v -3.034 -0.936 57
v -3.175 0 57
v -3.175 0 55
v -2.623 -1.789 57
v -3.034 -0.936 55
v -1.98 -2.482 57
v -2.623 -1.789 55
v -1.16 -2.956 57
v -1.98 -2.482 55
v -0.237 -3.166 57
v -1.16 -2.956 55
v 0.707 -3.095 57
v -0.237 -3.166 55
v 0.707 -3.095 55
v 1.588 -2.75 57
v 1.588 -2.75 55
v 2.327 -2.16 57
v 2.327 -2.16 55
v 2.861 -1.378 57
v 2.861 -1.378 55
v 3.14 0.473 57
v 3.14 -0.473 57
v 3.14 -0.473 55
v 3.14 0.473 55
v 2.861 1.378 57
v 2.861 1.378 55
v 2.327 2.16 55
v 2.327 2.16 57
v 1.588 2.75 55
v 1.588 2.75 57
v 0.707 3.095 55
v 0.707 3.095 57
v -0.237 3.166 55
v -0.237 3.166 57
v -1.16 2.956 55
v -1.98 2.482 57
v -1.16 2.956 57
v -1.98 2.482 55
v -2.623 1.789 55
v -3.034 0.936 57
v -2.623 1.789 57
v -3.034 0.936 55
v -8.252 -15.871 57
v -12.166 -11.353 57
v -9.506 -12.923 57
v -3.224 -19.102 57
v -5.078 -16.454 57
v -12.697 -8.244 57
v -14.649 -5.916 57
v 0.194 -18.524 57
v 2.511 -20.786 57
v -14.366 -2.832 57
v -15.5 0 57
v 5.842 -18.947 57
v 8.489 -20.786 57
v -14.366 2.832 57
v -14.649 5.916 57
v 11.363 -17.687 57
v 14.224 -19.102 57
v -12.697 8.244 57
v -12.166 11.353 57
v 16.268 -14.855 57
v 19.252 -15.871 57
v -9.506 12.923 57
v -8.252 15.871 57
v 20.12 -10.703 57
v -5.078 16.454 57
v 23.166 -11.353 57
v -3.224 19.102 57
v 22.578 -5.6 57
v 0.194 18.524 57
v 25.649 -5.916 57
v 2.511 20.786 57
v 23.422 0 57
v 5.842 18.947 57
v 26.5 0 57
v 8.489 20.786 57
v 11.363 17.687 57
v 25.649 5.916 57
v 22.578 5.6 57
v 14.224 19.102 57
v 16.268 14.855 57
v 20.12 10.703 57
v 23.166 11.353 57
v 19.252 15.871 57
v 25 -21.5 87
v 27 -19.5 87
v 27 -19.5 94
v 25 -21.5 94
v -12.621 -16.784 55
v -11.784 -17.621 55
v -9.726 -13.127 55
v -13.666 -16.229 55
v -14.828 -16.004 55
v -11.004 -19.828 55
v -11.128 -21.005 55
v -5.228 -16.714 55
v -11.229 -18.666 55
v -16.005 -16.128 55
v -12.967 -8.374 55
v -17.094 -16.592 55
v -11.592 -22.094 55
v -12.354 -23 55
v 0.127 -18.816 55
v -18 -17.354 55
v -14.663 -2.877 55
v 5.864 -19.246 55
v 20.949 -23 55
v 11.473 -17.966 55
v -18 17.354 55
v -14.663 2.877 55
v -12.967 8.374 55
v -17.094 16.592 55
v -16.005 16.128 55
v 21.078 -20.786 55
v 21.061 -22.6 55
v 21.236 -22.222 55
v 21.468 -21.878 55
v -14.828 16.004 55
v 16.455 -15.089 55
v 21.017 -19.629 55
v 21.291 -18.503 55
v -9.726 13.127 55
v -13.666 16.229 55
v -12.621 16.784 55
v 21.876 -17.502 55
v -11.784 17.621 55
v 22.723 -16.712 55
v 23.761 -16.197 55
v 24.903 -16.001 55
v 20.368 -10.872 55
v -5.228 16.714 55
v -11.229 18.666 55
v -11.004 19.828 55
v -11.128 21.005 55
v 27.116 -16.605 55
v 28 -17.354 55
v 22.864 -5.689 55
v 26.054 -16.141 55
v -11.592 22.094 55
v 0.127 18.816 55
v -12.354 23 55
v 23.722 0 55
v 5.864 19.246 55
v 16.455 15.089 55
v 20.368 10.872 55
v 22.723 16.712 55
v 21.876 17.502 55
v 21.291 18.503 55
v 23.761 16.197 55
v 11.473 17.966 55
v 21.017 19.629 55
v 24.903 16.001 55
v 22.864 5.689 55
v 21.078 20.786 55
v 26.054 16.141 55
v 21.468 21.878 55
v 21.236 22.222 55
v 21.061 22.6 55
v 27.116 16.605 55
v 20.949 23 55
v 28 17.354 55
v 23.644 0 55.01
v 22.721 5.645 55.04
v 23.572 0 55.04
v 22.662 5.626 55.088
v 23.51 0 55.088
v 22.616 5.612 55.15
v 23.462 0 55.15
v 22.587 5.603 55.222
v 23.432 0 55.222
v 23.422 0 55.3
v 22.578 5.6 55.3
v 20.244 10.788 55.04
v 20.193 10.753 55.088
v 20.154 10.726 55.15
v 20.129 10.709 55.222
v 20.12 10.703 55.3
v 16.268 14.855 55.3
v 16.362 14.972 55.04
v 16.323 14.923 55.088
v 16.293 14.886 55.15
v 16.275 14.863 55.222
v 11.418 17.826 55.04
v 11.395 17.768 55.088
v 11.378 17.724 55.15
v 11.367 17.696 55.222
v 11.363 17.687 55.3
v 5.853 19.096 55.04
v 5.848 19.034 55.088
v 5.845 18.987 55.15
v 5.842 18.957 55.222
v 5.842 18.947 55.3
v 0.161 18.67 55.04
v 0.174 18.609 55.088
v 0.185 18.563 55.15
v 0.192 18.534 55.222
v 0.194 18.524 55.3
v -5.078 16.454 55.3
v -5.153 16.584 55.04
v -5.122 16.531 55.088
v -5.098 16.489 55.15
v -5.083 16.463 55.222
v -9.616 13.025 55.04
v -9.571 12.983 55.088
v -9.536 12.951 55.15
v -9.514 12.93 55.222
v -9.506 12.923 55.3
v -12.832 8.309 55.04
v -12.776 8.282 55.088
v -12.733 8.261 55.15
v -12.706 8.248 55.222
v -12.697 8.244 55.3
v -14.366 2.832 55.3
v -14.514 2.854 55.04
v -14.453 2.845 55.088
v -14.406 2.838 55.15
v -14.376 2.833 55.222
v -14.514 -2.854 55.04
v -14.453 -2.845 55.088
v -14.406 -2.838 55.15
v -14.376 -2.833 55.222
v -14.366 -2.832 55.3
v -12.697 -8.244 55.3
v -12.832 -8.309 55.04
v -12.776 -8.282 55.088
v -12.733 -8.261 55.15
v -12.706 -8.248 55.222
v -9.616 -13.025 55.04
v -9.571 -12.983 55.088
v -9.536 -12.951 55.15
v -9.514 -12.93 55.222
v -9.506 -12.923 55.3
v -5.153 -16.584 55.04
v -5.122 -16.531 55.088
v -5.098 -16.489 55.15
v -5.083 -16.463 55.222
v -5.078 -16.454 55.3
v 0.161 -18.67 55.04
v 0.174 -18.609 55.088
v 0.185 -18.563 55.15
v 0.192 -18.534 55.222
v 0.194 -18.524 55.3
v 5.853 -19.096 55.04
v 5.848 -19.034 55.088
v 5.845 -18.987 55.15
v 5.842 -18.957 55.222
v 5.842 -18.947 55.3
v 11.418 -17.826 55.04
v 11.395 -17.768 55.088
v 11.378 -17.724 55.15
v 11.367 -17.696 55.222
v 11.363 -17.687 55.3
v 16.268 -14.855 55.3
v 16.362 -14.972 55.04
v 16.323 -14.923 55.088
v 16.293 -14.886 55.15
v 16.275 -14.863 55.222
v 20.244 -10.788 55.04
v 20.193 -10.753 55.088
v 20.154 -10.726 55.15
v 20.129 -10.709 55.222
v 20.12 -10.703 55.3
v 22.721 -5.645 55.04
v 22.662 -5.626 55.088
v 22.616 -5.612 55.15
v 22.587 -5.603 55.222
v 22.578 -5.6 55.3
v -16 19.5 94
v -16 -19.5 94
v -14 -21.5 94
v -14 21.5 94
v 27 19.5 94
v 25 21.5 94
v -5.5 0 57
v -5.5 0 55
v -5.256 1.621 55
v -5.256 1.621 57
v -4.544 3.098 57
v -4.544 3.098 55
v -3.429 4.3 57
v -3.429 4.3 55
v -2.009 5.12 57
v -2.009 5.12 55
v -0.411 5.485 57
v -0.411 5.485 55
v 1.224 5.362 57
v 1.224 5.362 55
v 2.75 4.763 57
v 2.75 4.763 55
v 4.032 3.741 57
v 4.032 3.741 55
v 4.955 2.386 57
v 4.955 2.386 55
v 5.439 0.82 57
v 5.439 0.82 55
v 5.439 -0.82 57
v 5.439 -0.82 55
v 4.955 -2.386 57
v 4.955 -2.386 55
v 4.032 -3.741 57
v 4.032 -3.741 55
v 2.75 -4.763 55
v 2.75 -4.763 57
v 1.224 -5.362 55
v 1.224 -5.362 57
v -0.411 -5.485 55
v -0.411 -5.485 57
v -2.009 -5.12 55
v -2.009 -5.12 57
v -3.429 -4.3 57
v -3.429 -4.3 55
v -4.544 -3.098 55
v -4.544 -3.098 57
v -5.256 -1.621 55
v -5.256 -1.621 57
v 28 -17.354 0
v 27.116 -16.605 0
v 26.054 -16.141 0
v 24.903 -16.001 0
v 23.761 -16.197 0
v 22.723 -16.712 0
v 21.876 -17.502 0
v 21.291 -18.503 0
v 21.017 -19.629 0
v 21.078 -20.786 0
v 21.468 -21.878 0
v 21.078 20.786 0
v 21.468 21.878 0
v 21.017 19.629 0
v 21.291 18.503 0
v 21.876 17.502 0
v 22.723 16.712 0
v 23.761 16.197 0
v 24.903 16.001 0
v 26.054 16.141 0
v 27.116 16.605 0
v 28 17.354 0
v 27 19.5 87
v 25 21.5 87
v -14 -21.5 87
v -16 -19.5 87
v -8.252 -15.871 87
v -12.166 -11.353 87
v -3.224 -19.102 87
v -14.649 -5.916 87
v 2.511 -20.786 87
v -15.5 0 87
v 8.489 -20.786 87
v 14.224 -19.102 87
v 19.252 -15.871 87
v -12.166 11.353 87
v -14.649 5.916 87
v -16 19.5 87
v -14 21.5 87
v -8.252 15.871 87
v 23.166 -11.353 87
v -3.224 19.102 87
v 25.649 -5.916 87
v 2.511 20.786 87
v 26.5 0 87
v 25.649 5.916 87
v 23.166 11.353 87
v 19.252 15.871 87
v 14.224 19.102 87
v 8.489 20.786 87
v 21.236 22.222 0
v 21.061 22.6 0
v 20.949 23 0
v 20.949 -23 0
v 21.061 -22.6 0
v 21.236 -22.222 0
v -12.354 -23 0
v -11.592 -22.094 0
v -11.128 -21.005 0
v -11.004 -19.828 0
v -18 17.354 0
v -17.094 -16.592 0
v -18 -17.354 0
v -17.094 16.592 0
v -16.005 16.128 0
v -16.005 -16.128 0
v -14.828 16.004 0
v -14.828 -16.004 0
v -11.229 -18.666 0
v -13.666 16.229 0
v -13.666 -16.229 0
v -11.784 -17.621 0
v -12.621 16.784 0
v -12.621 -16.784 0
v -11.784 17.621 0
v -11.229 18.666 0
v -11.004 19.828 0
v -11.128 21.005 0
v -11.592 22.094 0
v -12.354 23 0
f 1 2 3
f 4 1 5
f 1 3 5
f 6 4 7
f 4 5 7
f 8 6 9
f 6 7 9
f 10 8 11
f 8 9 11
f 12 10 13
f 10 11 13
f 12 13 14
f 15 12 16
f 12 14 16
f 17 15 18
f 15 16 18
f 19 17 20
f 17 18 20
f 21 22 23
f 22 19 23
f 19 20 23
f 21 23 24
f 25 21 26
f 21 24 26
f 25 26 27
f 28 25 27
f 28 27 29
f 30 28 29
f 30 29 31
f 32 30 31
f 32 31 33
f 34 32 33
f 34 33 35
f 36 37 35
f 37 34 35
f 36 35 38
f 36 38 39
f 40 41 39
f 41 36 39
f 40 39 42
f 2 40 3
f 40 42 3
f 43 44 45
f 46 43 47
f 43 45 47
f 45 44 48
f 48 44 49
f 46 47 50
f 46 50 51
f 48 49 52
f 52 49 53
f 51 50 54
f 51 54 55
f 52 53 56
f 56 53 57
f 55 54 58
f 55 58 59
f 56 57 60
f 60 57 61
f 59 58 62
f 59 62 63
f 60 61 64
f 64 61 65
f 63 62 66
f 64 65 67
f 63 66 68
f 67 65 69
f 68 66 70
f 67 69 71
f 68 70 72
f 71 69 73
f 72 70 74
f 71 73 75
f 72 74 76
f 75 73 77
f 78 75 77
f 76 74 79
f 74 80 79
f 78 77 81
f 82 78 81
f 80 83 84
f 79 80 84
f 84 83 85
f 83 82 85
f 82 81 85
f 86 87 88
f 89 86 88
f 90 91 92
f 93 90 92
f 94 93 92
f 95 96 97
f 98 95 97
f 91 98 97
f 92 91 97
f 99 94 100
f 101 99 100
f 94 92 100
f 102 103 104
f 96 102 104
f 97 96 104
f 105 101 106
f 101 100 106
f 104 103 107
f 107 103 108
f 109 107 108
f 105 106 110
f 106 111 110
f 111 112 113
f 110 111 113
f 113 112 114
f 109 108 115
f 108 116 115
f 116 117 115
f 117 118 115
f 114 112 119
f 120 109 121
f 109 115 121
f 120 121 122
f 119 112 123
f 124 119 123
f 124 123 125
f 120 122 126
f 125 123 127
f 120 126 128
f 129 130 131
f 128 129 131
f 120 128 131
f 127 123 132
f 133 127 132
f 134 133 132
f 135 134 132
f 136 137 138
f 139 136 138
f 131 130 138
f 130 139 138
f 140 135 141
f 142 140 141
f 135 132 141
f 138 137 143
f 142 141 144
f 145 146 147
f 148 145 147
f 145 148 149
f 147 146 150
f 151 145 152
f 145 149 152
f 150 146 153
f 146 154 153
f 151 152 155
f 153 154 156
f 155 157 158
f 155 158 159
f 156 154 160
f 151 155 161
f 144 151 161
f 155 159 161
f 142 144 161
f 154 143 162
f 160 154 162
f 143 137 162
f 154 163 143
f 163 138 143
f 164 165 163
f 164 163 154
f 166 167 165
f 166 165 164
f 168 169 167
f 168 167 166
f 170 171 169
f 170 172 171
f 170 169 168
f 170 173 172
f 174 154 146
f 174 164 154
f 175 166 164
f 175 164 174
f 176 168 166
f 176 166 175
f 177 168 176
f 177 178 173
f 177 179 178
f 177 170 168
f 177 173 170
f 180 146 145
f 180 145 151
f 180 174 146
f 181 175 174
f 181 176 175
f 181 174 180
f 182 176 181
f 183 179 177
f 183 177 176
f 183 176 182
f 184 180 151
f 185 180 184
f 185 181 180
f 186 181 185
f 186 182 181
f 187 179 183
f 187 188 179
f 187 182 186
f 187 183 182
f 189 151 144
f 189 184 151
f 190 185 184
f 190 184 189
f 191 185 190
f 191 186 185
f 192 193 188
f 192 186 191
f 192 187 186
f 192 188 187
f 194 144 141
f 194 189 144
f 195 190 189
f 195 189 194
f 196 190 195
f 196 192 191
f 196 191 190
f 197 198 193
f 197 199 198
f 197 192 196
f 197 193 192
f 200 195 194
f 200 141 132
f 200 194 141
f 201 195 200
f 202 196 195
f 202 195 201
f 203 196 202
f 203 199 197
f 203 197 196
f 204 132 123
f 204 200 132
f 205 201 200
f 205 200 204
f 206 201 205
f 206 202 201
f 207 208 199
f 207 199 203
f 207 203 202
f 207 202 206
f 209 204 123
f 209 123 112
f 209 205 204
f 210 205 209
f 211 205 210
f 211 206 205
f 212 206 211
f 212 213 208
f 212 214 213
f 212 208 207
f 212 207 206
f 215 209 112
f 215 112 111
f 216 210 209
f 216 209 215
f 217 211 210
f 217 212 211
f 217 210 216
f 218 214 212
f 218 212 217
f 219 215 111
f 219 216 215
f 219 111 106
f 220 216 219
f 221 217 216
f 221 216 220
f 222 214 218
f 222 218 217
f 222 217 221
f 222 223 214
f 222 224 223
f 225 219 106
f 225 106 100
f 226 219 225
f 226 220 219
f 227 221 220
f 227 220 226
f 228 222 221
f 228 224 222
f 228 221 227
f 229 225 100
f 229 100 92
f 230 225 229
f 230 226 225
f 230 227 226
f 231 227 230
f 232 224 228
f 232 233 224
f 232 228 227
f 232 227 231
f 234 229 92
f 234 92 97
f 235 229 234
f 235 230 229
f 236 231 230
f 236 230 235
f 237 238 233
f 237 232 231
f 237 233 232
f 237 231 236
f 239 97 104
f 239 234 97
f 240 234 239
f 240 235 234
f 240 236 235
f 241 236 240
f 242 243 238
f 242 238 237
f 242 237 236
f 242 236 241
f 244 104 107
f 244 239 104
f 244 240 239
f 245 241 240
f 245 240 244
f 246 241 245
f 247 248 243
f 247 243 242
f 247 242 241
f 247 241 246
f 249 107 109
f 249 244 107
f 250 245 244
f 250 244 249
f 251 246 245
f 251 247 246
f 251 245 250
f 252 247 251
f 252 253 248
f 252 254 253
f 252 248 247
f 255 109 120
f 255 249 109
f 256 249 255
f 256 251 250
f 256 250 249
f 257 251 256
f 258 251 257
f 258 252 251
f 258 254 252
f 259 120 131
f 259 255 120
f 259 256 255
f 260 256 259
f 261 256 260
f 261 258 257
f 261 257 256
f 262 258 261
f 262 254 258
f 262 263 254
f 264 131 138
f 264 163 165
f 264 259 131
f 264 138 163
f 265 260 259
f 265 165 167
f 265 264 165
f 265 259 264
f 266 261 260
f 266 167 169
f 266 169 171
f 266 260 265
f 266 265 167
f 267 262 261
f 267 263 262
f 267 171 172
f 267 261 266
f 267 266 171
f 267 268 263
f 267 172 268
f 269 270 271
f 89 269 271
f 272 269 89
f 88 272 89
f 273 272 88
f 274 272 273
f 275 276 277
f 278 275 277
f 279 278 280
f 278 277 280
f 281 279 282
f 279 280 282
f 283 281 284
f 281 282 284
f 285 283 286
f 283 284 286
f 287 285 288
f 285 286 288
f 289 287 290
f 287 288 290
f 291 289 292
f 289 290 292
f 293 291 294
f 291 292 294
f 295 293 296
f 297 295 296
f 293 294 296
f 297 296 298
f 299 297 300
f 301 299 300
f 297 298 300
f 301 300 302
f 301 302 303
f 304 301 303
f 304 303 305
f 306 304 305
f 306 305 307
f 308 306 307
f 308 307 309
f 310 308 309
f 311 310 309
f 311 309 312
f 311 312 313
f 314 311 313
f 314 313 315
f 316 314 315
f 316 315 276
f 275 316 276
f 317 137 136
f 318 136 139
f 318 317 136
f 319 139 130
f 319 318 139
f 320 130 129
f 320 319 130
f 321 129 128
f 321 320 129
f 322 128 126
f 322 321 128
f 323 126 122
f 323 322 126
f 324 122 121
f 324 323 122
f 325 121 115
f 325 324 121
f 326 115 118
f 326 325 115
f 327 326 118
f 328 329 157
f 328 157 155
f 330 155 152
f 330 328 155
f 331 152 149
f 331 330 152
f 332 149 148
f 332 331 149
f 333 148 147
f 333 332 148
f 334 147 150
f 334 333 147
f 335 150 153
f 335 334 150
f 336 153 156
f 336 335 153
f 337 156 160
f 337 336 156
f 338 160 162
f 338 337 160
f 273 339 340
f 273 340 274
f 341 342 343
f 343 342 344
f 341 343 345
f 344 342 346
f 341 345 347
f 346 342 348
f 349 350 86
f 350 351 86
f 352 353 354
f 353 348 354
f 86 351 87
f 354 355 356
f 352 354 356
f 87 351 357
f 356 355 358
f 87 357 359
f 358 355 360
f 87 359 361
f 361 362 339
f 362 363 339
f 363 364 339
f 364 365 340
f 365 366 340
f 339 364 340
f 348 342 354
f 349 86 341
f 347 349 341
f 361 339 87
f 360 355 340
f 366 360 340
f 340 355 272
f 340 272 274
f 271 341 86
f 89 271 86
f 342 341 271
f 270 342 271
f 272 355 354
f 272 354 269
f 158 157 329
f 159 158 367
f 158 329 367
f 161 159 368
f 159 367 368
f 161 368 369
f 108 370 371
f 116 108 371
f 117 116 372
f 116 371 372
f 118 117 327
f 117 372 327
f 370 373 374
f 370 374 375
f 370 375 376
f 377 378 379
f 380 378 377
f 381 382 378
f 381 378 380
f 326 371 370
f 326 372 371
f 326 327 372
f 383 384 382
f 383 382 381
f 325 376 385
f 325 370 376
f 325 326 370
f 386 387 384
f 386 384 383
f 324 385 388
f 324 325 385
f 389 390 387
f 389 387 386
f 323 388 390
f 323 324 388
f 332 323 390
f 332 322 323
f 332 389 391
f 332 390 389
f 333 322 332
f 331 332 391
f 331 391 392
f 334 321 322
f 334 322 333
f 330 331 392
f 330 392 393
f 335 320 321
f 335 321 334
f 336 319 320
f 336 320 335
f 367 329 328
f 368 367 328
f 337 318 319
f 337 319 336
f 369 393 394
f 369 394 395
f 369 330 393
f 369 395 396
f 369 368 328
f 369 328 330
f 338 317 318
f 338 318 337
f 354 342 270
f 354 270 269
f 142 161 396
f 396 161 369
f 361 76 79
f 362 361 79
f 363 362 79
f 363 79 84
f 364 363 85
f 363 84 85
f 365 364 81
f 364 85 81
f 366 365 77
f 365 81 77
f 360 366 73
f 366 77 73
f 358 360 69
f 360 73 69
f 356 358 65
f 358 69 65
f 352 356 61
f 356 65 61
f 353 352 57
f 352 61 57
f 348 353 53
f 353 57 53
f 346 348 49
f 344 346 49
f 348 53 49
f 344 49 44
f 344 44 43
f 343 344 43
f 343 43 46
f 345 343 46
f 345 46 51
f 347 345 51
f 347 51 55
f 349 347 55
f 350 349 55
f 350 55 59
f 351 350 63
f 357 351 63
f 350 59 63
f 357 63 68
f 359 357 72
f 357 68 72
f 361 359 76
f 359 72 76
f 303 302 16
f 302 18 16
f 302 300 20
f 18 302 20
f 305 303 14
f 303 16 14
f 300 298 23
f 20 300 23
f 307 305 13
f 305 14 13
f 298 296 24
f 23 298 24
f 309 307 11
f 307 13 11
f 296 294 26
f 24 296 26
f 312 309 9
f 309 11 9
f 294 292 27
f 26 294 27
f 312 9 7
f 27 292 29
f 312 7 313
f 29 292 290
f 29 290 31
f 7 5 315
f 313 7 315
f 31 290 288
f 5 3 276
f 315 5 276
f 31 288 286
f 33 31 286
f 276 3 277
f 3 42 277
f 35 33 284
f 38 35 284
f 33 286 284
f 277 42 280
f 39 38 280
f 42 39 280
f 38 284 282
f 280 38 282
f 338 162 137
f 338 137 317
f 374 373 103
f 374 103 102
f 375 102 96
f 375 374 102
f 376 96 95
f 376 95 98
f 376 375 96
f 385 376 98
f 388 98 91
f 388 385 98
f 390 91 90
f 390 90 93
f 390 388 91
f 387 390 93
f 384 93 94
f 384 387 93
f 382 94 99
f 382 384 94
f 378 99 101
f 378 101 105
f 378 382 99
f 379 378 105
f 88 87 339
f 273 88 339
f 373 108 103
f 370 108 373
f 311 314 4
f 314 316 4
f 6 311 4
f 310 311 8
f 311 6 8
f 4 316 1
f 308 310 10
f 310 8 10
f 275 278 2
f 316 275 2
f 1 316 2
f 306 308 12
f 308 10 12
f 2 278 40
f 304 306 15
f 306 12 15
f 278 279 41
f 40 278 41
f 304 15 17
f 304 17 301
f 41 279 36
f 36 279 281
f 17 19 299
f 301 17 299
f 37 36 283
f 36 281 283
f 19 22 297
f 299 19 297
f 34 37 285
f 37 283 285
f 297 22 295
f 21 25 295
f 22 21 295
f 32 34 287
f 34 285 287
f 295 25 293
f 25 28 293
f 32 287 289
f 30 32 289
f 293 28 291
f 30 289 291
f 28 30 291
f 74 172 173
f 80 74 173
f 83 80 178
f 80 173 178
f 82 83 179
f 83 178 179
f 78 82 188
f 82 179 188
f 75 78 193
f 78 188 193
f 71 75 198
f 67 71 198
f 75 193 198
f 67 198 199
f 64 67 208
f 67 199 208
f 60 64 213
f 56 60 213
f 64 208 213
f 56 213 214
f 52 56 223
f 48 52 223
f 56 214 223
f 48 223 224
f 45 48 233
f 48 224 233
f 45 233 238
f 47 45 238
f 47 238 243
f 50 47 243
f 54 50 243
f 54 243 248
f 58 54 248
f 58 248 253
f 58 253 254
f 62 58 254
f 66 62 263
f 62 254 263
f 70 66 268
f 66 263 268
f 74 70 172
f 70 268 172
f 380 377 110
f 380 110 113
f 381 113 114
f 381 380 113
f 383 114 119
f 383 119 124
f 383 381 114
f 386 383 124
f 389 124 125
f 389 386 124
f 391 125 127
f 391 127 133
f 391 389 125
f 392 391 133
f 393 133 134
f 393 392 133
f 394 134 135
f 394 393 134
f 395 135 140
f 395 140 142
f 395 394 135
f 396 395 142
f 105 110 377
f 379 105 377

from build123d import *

# Parameters (mm, degrees)
SKETCH_1_W                  = 55
SKETCH_1_H                  = 46
EXTRUDE_1_DEPTH             = 46
SKETCH_2_R                  = 19
EXTRUDE_2_DEPTH             = 2
FILLET_1_R                  = 0.3
HOLE_WIZARD_11_0_11_1_D     = 11
HOLE_WIZARD_11_0_11_1_DEPTH = 2
SKETCH_5_R                  = 3.175
EXTRUDE_3_DEPTH             = 21
CUT_EXTRUDE_START           = -18
CUT_EXTRUDE_1_DEPTH         = 18
HOLE_WIZARD_8_0_8_1_DEPTH   = 55
HOLE_WIZARD_5_2_5_2_2_D     = 5.2
HOLE_WIZARD_5_2_5_2_2_DEPTH = 55
HOLE_WIZARD_2_0_2_1_D       = 2
HOLE_WIZARD_2_0_2_1_DEPTH   = 10
CHAMFER_1_SIZE              = 0.5
CHAMFER_2_SIZE              = 0.1
SKETCH_15_R                 = 21
EXTRUDE_4_DEPTH             = 30
SKETCH_16_W                 = 43
SKETCH_16_H                 = 43
EXTRUDE_5_DEPTH             = 7
CHAMFER_3_SIZE              = 2


# Read off the part's stored shape, not the designer's step: Ø8.0 (8) 直径孔1
with BuildPart() as part:
    # 草图1 → 凸台-拉伸1 (new body)
    with BuildSketch(Plane(origin=(28, 0, 0), x_dir=(0, 0, -1), z_dir=(1, 0, 0))):
        with Locations((-27.5, 0)):
            Rectangle(SKETCH_1_W, SKETCH_1_H)
    extrude(amount=-EXTRUDE_1_DEPTH)

    # 草图2 → 凸台-拉伸2 (add)
    with BuildSketch(Plane.XY.offset(55)):
        with Locations((4.421826919, 0)):
            Circle(SKETCH_2_R)
    extrude(amount=EXTRUDE_2_DEPTH)

    # 圆角1
    fillet_1_edges = [part.edges().sort_by_distance(p)[0] for p in [
        (-14.578173081, 0, 55),
    ]]
    fillet(fillet_1_edges, radius=FILLET_1_R)

    # Ø11.0 (11) 直径孔1
    with Locations(Plane.XY.offset(57)):
        with Locations((0, 0)):
            Hole(HOLE_WIZARD_11_0_11_1_D / 2, depth=HOLE_WIZARD_11_0_11_1_DEPTH)

    # 草图5 → 凸台-拉伸3 (add)
    with BuildSketch(Plane.XY.offset(55)):
        with Locations(Location((0, 0, 0), (0, 0, 180))):
            Circle(SKETCH_5_R)
    extrude(amount=EXTRUDE_3_DEPTH)

    # 草图6 → 切除-拉伸1 (cut)
    with BuildSketch(Plane.XY.offset(76).offset(CUT_EXTRUDE_START)):
        with BuildLine():
            Line((-2.107130751, 2.375), (2.107130751, 2.375))
            ThreePointArc((2.107130751, 2.375), (0, 3.175), (-2.107130751, 2.375))
        make_face()
    extrude(amount=CUT_EXTRUDE_1_DEPTH, mode=Mode.SUBTRACT)

    # Ø8.0 (8) 直径孔1 outline → Ø8.0 (8) 直径孔1 (cut)
    with BuildSketch(Plane.XY):
        with BuildLine():
            ThreePointArc((-12.354248689, -23), (-12.171572875, -17.171572875), (-18, -17.354248689))
            Line((-18, -17.354248689), (-18, -23))
            Line((-18, -23), (-12.354248689, -23))
        make_face()
        with BuildLine():
            Line((-18, 23), (-18, 17.354248689))
            ThreePointArc((-18, 17.354248689), (-12.171572875, 17.171572875), (-12.354248689, 23))
            Line((-12.354248689, 23), (-18, 23))
        make_face()
        with BuildLine():
            ThreePointArc((28, -17.354248689), (22.171572875, -17.171572875), (22.354248689, -23))
            Line((22.354248689, -23), (28, -23))
            Line((28, -23), (28, -17.354248689))
        make_face()
        with BuildLine():
            Line((28, 23), (22.354248689, 23))
            ThreePointArc((22.354248689, 23), (22.171572875, 17.171572875), (28, 17.354248689))
            Line((28, 17.354248689), (28, 23))
        make_face()
    extrude(amount=HOLE_WIZARD_8_0_8_1_DEPTH, mode=Mode.SUBTRACT)

    # Ø5.2 (5.2) 直径孔2
    with Locations(Plane.XY.offset(55)):
        with Locations((23.5, 23.5), (23.5, -23.5), (-23.5, 23.5)):
            Hole(HOLE_WIZARD_5_2_5_2_2_D / 2, depth=HOLE_WIZARD_5_2_5_2_2_DEPTH)

    # Ø2.0 (2) 直径孔1
    with Locations(Plane.XY.offset(76)):
        with Locations((0, 0)):
            Hole(HOLE_WIZARD_2_0_2_1_D / 2, depth=HOLE_WIZARD_2_0_2_1_DEPTH)

    # 倒角1
    chamfer_1_edges = [part.edges().sort_by_distance(p)[0] for p in [
        (1.302014759, -2.895752504, 76),
        (0, 2.375, 76),
    ]]
    chamfer(chamfer_1_edges, length=CHAMFER_1_SIZE)

    # 倒角2
    chamfer_2_edges = [part.edges().sort_by_distance(p)[0] for p in [
        (1, 0, 76),
    ]]
    chamfer(chamfer_2_edges, length=CHAMFER_2_SIZE)

    # 草图15 → 凸台-拉伸4 (add)
    with BuildSketch(Plane.XY.offset(57)):
        with Locations((5.5, 0)):
            Circle(SKETCH_15_R)
    extrude(amount=EXTRUDE_4_DEPTH)

    # 草图16 → 凸台-拉伸5 (add)
    with BuildSketch(Plane.XY.offset(87)):
        with Locations((5.5, 0)):
            Rectangle(SKETCH_16_W, SKETCH_16_H)
    extrude(amount=EXTRUDE_5_DEPTH)

    # 倒角3
    chamfer_3_edges = [part.edges().sort_by_distance(p)[0] for p in [
        (27, -21.5, 90.5),
        (27, 21.5, 90.5),
        (-16, 21.5, 90.5),
        (-16, -21.5, 90.5),
    ]]
    chamfer(chamfer_3_edges, length=CHAMFER_3_SIZE)


solid = part.part
